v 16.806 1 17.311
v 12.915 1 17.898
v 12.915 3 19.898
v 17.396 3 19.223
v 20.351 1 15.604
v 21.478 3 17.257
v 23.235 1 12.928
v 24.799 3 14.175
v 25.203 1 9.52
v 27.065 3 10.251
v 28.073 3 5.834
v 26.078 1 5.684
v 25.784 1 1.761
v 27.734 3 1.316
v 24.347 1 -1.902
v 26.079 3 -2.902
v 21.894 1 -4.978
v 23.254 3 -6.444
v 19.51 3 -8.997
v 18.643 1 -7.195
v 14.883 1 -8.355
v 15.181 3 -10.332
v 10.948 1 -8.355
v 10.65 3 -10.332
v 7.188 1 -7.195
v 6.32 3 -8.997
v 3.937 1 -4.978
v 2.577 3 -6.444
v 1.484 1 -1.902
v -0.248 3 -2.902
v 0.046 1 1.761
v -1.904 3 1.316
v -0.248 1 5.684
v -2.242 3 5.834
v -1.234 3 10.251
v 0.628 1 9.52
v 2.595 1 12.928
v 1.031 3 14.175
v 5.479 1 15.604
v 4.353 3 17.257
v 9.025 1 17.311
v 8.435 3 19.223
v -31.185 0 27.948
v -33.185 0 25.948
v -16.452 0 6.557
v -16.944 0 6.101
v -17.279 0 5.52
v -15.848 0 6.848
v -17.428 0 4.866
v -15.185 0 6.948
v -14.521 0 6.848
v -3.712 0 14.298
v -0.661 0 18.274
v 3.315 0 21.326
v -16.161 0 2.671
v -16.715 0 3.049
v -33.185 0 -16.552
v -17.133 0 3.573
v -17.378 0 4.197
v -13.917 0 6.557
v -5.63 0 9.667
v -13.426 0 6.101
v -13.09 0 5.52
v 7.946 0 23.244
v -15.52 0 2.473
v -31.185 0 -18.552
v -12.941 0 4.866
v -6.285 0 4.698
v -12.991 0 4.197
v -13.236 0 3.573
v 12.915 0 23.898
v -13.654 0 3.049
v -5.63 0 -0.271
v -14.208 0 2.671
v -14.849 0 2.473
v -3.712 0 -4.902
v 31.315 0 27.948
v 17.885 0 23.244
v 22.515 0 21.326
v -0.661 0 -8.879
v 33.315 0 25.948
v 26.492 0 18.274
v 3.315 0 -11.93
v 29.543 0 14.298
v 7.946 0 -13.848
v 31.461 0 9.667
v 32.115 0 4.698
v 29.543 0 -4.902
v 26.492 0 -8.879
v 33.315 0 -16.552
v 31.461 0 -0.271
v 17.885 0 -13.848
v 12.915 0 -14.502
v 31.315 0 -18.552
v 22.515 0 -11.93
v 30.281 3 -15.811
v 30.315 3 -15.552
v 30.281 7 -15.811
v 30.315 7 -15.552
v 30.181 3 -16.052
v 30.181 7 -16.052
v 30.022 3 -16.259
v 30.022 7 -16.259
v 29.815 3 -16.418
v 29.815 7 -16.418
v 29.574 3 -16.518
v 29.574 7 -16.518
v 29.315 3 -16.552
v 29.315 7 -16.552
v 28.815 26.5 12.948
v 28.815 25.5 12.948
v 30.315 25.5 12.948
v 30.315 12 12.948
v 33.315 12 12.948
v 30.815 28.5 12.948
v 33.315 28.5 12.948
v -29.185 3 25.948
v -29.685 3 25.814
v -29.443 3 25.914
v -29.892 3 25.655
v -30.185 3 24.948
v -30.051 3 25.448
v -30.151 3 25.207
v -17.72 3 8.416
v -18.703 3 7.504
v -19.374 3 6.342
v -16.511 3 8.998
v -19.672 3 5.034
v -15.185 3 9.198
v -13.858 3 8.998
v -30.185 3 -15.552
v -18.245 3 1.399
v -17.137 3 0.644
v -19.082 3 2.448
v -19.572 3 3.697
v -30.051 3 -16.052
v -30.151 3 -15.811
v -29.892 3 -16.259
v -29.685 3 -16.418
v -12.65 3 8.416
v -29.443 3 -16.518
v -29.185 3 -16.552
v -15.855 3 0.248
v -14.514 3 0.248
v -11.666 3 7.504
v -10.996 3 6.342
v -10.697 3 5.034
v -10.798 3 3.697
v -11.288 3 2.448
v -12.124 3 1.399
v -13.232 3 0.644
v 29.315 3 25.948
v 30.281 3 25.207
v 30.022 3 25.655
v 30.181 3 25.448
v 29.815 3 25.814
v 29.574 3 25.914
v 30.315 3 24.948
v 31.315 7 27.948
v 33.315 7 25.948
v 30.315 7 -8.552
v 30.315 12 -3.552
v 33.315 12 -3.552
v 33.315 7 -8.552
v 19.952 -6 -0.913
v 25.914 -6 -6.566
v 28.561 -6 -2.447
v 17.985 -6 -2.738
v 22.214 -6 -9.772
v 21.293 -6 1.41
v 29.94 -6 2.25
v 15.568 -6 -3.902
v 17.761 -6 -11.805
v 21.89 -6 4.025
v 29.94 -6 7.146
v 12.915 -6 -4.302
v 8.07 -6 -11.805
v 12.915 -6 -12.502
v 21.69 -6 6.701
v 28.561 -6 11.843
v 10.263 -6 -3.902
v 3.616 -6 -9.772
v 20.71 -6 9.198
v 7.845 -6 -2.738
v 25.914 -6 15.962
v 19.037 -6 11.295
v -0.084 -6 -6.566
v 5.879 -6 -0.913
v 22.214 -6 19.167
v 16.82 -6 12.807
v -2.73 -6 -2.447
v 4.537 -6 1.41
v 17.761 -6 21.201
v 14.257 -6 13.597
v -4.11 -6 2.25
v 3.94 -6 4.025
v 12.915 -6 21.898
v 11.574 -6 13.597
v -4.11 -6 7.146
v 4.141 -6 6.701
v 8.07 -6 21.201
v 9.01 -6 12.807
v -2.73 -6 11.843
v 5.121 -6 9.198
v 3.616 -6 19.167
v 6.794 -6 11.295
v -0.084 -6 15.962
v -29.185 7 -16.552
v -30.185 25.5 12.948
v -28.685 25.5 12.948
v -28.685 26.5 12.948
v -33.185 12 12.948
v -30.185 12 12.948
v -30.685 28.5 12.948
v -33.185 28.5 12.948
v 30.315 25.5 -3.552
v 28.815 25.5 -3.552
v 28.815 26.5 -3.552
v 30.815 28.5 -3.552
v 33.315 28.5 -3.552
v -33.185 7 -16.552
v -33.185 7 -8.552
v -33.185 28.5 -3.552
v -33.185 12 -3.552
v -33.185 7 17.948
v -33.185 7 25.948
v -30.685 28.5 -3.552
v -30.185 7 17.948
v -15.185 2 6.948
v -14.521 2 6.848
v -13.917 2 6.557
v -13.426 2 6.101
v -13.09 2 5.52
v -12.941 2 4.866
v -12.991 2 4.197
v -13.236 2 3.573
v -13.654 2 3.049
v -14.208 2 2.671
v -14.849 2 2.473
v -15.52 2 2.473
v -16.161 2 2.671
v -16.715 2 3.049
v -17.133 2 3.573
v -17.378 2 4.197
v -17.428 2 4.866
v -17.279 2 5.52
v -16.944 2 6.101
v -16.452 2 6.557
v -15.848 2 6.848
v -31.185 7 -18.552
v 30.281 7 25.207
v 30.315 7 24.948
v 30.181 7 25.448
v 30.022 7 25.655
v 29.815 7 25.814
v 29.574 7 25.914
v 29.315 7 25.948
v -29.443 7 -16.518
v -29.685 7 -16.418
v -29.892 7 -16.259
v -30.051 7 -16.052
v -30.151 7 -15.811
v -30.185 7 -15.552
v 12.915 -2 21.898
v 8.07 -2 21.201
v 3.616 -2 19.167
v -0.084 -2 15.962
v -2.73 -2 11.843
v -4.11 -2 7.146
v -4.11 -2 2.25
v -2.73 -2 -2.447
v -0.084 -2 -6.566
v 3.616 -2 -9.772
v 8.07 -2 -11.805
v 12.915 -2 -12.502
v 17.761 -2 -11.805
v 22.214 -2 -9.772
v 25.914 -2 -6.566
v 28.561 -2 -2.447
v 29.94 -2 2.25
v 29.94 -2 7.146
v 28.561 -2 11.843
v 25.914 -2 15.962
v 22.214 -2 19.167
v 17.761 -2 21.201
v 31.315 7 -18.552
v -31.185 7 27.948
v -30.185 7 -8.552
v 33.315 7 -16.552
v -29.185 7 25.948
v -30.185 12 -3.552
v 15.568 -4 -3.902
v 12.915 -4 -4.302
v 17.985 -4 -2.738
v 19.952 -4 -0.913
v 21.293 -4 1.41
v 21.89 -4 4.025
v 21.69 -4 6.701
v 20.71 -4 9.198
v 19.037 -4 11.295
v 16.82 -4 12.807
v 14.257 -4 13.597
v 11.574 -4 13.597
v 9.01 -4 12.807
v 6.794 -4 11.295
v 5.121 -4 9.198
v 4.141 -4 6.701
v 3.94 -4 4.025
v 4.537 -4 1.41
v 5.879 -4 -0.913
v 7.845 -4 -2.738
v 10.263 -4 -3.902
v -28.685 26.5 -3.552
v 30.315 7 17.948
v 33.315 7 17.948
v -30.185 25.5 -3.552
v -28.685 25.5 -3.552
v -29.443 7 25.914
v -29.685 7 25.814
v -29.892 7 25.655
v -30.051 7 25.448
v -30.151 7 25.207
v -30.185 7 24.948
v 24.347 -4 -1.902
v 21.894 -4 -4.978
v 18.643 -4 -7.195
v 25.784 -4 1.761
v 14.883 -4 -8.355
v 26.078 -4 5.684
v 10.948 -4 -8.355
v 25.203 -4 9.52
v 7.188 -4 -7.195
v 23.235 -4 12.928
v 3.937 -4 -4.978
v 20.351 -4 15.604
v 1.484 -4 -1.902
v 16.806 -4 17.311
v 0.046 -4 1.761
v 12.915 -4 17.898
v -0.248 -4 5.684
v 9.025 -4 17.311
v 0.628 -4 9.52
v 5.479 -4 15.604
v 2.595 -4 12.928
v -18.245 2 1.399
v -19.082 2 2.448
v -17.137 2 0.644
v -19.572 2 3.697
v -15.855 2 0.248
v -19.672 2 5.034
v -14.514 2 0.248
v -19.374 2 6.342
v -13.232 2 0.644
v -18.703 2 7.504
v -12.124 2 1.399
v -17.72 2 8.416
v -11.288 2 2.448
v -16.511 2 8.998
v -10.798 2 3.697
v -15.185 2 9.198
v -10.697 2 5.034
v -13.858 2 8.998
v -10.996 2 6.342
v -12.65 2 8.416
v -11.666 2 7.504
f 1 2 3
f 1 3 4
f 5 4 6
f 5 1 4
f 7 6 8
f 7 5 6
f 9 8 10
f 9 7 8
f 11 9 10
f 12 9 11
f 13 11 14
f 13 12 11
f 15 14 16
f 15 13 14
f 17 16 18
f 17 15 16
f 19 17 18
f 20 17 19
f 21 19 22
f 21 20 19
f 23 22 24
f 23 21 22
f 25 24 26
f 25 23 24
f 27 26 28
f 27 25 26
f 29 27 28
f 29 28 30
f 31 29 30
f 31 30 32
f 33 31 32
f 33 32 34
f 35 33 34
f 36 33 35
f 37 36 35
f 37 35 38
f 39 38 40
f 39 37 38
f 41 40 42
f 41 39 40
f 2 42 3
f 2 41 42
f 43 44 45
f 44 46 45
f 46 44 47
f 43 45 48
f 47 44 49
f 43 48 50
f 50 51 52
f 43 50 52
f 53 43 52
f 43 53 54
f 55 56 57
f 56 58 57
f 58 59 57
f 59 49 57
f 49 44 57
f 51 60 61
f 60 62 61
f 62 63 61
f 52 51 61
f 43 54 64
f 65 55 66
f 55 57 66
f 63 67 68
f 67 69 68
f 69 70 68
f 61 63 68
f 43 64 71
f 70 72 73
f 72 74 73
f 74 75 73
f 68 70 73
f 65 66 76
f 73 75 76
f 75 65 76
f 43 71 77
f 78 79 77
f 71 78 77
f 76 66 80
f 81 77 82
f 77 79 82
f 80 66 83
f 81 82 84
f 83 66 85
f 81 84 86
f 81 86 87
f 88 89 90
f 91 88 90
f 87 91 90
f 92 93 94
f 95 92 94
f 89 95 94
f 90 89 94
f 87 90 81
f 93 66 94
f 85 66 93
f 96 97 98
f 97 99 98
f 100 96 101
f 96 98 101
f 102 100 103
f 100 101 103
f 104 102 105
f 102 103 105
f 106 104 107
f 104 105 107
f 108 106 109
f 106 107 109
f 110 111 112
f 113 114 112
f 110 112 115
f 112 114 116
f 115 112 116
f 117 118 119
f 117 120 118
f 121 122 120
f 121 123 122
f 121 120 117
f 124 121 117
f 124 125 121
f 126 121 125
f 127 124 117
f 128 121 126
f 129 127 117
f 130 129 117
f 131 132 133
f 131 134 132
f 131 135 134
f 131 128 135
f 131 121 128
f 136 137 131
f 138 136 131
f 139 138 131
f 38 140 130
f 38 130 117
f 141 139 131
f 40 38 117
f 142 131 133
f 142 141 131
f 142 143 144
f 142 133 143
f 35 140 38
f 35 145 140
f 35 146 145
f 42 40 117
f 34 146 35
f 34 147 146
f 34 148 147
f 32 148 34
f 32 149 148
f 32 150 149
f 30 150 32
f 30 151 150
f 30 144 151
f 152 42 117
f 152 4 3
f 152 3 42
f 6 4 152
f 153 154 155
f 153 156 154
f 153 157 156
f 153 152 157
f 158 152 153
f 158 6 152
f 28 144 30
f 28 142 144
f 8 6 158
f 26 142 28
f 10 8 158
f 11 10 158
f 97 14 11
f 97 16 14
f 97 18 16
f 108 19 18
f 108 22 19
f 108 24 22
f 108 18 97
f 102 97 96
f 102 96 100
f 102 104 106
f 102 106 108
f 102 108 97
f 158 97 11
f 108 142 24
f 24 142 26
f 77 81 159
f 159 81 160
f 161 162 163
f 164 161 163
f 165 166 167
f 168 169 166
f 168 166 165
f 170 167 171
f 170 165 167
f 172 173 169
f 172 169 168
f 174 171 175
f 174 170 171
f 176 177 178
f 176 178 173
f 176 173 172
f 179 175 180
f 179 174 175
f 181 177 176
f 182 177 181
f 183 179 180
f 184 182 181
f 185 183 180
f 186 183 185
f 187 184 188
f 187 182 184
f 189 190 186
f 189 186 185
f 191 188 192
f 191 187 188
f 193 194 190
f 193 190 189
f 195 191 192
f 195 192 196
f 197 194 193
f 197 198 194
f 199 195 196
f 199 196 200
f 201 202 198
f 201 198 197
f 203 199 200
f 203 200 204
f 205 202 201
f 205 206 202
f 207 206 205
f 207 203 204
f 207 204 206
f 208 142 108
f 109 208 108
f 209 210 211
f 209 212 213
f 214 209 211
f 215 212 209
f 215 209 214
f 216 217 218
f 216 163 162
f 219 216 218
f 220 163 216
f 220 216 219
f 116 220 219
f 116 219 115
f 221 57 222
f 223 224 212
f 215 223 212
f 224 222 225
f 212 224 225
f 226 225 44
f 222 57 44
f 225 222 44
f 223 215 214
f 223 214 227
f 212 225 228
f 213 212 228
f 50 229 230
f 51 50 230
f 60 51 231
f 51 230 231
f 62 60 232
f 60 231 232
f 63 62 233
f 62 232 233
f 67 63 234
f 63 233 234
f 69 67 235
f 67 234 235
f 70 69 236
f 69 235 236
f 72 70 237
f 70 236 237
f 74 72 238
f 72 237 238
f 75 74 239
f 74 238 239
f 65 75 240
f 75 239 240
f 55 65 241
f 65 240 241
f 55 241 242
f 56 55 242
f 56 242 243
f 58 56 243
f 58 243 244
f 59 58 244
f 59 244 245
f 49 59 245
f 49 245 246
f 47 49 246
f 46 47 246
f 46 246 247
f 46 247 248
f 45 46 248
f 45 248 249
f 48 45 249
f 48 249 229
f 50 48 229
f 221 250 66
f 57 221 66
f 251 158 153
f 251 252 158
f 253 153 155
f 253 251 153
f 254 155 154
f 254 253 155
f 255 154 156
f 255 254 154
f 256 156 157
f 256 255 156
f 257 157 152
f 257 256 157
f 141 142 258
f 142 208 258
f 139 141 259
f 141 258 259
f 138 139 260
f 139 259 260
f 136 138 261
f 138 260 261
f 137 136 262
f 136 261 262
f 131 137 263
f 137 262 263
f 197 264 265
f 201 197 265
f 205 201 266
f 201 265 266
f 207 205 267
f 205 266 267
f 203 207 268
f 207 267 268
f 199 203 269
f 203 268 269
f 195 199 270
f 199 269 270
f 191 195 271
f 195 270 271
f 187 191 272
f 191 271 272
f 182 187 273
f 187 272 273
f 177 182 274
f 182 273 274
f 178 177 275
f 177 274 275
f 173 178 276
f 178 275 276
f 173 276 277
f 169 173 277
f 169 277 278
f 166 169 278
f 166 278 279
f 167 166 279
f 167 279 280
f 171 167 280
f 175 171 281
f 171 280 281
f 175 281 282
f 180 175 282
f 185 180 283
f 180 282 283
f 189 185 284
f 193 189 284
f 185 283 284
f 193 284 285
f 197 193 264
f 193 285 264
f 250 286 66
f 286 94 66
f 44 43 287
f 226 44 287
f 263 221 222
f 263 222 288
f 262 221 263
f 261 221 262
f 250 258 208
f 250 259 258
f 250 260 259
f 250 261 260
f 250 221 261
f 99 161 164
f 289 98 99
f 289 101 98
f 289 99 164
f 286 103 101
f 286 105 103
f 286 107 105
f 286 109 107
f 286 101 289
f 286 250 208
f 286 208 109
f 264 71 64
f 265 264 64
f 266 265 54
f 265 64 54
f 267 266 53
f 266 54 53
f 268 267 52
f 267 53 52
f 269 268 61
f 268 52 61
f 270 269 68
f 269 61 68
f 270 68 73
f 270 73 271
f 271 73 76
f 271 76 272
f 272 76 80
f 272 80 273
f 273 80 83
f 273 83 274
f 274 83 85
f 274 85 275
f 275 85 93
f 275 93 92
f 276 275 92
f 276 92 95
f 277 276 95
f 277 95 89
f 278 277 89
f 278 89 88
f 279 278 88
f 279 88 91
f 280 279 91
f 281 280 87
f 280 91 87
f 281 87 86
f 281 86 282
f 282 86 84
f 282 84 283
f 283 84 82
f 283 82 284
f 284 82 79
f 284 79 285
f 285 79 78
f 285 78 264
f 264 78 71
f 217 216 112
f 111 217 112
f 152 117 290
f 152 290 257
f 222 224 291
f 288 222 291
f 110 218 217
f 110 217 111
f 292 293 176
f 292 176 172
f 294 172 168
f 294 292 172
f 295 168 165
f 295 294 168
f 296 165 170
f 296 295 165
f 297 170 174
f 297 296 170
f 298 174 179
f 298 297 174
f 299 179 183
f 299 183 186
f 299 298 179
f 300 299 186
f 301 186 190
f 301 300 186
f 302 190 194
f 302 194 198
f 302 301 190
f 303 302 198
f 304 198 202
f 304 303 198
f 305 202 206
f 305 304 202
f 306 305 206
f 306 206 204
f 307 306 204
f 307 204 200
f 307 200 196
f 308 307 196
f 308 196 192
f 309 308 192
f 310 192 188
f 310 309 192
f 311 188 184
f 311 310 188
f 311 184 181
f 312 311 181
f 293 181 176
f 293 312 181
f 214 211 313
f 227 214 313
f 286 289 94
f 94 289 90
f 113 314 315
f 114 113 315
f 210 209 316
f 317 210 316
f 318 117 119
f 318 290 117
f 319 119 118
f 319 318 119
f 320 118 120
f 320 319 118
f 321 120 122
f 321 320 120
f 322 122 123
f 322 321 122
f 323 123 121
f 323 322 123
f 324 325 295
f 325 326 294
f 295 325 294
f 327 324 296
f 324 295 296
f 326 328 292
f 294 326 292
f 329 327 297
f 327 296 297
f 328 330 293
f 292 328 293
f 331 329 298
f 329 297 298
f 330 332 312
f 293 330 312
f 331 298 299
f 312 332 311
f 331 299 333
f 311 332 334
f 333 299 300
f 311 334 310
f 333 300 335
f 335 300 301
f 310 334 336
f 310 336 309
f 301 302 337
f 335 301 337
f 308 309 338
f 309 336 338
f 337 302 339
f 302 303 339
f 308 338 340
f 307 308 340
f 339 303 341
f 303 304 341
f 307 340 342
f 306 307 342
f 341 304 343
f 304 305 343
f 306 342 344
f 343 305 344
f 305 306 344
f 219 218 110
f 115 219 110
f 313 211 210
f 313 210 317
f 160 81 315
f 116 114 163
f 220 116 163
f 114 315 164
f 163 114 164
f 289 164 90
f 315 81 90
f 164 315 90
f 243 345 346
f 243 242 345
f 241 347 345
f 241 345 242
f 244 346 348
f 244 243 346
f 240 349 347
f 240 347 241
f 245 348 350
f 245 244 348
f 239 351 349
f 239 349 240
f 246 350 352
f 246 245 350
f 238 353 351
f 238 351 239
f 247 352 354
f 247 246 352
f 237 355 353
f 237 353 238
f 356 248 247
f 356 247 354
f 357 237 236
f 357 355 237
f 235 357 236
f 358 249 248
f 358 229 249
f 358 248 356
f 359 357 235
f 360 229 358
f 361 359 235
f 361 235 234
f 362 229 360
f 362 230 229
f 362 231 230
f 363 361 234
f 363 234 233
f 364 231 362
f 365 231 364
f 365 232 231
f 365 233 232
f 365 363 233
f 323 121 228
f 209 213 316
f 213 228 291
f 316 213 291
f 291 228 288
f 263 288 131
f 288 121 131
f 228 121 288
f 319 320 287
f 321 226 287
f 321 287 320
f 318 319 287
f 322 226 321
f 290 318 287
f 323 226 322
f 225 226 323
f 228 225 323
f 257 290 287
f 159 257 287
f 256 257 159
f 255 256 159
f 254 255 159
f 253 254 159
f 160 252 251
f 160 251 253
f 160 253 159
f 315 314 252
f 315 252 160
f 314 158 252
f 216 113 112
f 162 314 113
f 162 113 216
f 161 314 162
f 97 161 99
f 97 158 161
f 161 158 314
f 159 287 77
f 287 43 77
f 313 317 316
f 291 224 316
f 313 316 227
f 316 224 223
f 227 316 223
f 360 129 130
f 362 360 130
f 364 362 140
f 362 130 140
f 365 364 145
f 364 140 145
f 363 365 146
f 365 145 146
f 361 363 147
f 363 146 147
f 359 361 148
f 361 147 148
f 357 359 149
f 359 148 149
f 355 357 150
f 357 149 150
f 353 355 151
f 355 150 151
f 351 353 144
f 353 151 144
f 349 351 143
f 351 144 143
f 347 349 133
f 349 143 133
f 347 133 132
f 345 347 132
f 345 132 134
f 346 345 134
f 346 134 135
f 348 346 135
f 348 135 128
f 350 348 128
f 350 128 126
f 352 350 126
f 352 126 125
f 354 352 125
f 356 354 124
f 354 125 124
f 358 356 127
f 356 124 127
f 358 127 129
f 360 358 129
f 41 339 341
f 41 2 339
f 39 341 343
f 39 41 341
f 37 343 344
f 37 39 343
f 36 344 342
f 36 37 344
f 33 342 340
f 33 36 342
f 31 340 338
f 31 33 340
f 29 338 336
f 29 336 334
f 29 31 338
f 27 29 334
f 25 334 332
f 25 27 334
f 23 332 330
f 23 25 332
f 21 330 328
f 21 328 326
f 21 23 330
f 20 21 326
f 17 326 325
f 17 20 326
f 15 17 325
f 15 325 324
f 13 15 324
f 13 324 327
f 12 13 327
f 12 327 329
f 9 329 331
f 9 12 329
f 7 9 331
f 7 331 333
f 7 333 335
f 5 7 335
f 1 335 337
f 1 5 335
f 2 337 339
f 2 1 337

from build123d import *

# Parameters (mm, degrees)
SKETCH1_W           = 66.5
SKETCH1_H           = 46.5
BOSS_EXTRUDE1_DEPTH = 3
SKETCH2_W           = 60.5
SKETCH2_H           = 42.5
BOSS_EXTRUDE2_DEPTH = 4
SKETCH3_R           = 13.2
CUT_EXTRUDE1_DEPTH  = 4
SKETCH4_R           = 2.25
CUT_EXTRUDE2_DEPTH  = 4
SKETCH5_R           = 4.5
CUT_EXTRUDE3_DEPTH  = 1
SKETCH6_R           = 17.2
SKETCH6_R_2         = 13.2
BOSS_EXTRUDE3_DEPTH = 6
FILLET1_R           = 1
CHAMFER1_SIZE       = 2
SKETCH7_W           = 3
SKETCH7_H           = 16.5
BOSS_EXTRUDE4_DEPTH = 21.5
SKETCH8_W           = 16.5
SKETCH8_H           = 3
BOSS_EXTRUDE5_DEPTH = 1.5
SKETCH9_W           = 16.5
SKETCH9_H           = 3
BOSS_EXTRUDE6_DEPTH = 1.5
CHAMFER2_SIZE       = 2
CHAMFER3_SIZE       = 2
CHAMFER4_SIZE       = 2
CHAMFER5_SIZE       = 5
CHAMFER6_SIZE       = 5
BOSS_EXTRUDE7_START = -2
SKETCH10_R          = 13.2
SKETCH10_R_2        = 9
BOSS_EXTRUDE7_DEPTH = 2


with BuildPart() as part:
    # Sketch1 → Boss-Extrude1 (new body)
    with BuildSketch(Plane(origin=(0, 0, 0), x_dir=(1, 0, 0), z_dir=(0, 1, 0))):
        with Locations((0.065324165, -4.697937132)):
            Rectangle(SKETCH1_W, SKETCH1_H)
    extrude(amount=BOSS_EXTRUDE1_DEPTH)

    # Sketch2 → Boss-Extrude2 (add)
    with BuildSketch(Plane(origin=(0, 3, 0), x_dir=(1, 0, 0), z_dir=(0, 1, 0))):
        Polygon((-30.184675835, 18.552062868), (-33.184675835, 18.552062868), (-33.184675835, 16.552062868), (-33.184675835, -25.947937132), (-33.184675835, -27.947937132), (-30.184675835, -27.947937132), (30.315324165, -27.947937132), (33.315324165, -27.947937132), (33.315324165, -25.947937132), (33.315324165, 16.552062868), (33.315324165, 18.552062868), (30.315324165, 18.552062868), align=None)
        with Locations((0.065324165, -4.697937132)):
            Rectangle(SKETCH2_W, SKETCH2_H, mode=Mode.SUBTRACT)
    extrude(amount=BOSS_EXTRUDE2_DEPTH)

    # Sketch3 → Cut-Extrude1 (cut)
    with BuildSketch(Plane(origin=(0, 3, 0), x_dir=(1, 0, 0), z_dir=(0, 1, 0))):
        with Locations(Location((12.915324165, -4.697937132, 0), (0, 0, 270))):
            Circle(SKETCH3_R)
    extrude(amount=-CUT_EXTRUDE1_DEPTH, mode=Mode.SUBTRACT)

    # Sketch4 → Cut-Extrude2 (cut)
    with BuildSketch(Plane(origin=(0, 3, 0), x_dir=(1, 0, 0), z_dir=(0, 1, 0))):
        with Locations(Location((-15.184675835, -4.697937132, 0), (0, 0, 270))):
            Circle(SKETCH4_R)
    extrude(amount=-CUT_EXTRUDE2_DEPTH, mode=Mode.SUBTRACT)

    # Sketch5 → Cut-Extrude3 (cut)
    with BuildSketch(Plane(origin=(0, 3, 0), x_dir=(1, 0, 0), z_dir=(0, 1, 0))):
        with Locations(Location((-15.184675835, -4.697937132, 0), (0, 0, 270))):
            Circle(SKETCH5_R)
    extrude(amount=-CUT_EXTRUDE3_DEPTH, mode=Mode.SUBTRACT)

    # Sketch6 → Boss-Extrude3 (add)
    with BuildSketch(Plane.XZ):
        with Locations(Location((12.915324165, 4.697937132, 0), (0, 0, 90))):
            Circle(SKETCH6_R)
        with Locations(Location((12.915324165, 4.697937132, 0), (0, 0, 90))):
            Circle(SKETCH6_R_2, mode=Mode.SUBTRACT)
    extrude(amount=BOSS_EXTRUDE3_DEPTH)

    # Fillet1
    fillet1_edges = [part.edges().sort_by_distance(p)[0] for p in [
        (-30.184675835, 5, -16.552062868),
        (30.315324165, 5, -16.552062868),
        (30.315324165, 5, 25.947937132),
        (-30.184675835, 5, 25.947937132),
    ]]
    fillet(fillet1_edges, radius=FILLET1_R)

    # Chamfer1
    chamfer1_edges = [part.edges().sort_by_distance(p)[0] for p in [
        (-33.184675835, 3.5, -18.552062868),
        (33.315324165, 3.5, -18.552062868),
        (33.315324165, 3.5, 27.947937132),
        (-33.184675835, 3.5, 27.947937132),
    ]]
    chamfer(chamfer1_edges, length=CHAMFER1_SIZE)

    # Sketch7 → Boss-Extrude4 (add)
    with BuildSketch(Plane(origin=(0, 7, 0), x_dir=(1, 0, 0), z_dir=(0, 1, 0))):
        with Locations((31.815324165, -4.697937132)):
            Rectangle(SKETCH7_W, SKETCH7_H)
        with Locations((-31.684675835, -4.697937132)):
            Rectangle(SKETCH7_W, SKETCH7_H)
    extrude(amount=BOSS_EXTRUDE4_DEPTH)

    # Sketch8 → Boss-Extrude5 (add)
    with BuildSketch(Plane.ZY.offset(-30.315324165)):
        with Locations((4.697937132, 27)):
            Rectangle(SKETCH8_W, SKETCH8_H)
    extrude(amount=BOSS_EXTRUDE5_DEPTH)

    # Sketch9 → Boss-Extrude6 (add)
    with BuildSketch(Plane(origin=(-30.184675835, 0, 0), x_dir=(0, 0, -1), z_dir=(1, 0, 0))):
        with Locations((-4.697937132, 27)):
            Rectangle(SKETCH9_W, SKETCH9_H)
    extrude(amount=BOSS_EXTRUDE6_DEPTH)

    # Chamfer2
    chamfer2_edges = [part.edges().sort_by_distance(p)[0] for p in [
        (28.815324165, 28.5, 4.697937132),
        (-28.684675835, 28.5, 4.697937132),
    ]]
    chamfer(chamfer2_edges, length=CHAMFER2_SIZE)

    # Chamfer3
    chamfer3_edges = [part.edges().sort_by_distance(p)[0] for p in [
        (12.915324165, 3, -8.502062868),
    ]]
    chamfer(chamfer3_edges, length=CHAMFER3_SIZE)

    # Chamfer4
    chamfer4_edges = [part.edges().sort_by_distance(p)[0] for p in [
        (12.915324165, 0, -12.502062868),
    ]]
    chamfer(chamfer4_edges, length=CHAMFER4_SIZE)

    # Chamfer5
    chamfer5_edges = [part.edges().sort_by_distance(p)[0] for p in [
        (31.815324165, 7, -3.552062868),
        (31.815324165, 7, 12.947937132),
    ]]
    chamfer(chamfer5_edges, length=CHAMFER5_SIZE)

    # Chamfer6
    chamfer6_edges = [part.edges().sort_by_distance(p)[0] for p in [
        (-31.684675835, 7, -3.552062868),
        (-31.684675835, 7, 12.947937132),
    ]]
    chamfer(chamfer6_edges, length=CHAMFER6_SIZE)

    # Sketch10 → Boss-Extrude7 (add)
    with BuildSketch(Plane.XZ.offset(6).offset(BOSS_EXTRUDE7_START)):
        with Locations(Location((12.915324165, 4.697937132, 0), (0, 0, 90))):
            Circle(SKETCH10_R)
        with Locations(Location((12.915324165, 4.697937132, 0), (0, 0, 270))):
            Circle(SKETCH10_R_2, mode=Mode.SUBTRACT)
    extrude(amount=BOSS_EXTRUDE7_DEPTH)


solid = part.part
